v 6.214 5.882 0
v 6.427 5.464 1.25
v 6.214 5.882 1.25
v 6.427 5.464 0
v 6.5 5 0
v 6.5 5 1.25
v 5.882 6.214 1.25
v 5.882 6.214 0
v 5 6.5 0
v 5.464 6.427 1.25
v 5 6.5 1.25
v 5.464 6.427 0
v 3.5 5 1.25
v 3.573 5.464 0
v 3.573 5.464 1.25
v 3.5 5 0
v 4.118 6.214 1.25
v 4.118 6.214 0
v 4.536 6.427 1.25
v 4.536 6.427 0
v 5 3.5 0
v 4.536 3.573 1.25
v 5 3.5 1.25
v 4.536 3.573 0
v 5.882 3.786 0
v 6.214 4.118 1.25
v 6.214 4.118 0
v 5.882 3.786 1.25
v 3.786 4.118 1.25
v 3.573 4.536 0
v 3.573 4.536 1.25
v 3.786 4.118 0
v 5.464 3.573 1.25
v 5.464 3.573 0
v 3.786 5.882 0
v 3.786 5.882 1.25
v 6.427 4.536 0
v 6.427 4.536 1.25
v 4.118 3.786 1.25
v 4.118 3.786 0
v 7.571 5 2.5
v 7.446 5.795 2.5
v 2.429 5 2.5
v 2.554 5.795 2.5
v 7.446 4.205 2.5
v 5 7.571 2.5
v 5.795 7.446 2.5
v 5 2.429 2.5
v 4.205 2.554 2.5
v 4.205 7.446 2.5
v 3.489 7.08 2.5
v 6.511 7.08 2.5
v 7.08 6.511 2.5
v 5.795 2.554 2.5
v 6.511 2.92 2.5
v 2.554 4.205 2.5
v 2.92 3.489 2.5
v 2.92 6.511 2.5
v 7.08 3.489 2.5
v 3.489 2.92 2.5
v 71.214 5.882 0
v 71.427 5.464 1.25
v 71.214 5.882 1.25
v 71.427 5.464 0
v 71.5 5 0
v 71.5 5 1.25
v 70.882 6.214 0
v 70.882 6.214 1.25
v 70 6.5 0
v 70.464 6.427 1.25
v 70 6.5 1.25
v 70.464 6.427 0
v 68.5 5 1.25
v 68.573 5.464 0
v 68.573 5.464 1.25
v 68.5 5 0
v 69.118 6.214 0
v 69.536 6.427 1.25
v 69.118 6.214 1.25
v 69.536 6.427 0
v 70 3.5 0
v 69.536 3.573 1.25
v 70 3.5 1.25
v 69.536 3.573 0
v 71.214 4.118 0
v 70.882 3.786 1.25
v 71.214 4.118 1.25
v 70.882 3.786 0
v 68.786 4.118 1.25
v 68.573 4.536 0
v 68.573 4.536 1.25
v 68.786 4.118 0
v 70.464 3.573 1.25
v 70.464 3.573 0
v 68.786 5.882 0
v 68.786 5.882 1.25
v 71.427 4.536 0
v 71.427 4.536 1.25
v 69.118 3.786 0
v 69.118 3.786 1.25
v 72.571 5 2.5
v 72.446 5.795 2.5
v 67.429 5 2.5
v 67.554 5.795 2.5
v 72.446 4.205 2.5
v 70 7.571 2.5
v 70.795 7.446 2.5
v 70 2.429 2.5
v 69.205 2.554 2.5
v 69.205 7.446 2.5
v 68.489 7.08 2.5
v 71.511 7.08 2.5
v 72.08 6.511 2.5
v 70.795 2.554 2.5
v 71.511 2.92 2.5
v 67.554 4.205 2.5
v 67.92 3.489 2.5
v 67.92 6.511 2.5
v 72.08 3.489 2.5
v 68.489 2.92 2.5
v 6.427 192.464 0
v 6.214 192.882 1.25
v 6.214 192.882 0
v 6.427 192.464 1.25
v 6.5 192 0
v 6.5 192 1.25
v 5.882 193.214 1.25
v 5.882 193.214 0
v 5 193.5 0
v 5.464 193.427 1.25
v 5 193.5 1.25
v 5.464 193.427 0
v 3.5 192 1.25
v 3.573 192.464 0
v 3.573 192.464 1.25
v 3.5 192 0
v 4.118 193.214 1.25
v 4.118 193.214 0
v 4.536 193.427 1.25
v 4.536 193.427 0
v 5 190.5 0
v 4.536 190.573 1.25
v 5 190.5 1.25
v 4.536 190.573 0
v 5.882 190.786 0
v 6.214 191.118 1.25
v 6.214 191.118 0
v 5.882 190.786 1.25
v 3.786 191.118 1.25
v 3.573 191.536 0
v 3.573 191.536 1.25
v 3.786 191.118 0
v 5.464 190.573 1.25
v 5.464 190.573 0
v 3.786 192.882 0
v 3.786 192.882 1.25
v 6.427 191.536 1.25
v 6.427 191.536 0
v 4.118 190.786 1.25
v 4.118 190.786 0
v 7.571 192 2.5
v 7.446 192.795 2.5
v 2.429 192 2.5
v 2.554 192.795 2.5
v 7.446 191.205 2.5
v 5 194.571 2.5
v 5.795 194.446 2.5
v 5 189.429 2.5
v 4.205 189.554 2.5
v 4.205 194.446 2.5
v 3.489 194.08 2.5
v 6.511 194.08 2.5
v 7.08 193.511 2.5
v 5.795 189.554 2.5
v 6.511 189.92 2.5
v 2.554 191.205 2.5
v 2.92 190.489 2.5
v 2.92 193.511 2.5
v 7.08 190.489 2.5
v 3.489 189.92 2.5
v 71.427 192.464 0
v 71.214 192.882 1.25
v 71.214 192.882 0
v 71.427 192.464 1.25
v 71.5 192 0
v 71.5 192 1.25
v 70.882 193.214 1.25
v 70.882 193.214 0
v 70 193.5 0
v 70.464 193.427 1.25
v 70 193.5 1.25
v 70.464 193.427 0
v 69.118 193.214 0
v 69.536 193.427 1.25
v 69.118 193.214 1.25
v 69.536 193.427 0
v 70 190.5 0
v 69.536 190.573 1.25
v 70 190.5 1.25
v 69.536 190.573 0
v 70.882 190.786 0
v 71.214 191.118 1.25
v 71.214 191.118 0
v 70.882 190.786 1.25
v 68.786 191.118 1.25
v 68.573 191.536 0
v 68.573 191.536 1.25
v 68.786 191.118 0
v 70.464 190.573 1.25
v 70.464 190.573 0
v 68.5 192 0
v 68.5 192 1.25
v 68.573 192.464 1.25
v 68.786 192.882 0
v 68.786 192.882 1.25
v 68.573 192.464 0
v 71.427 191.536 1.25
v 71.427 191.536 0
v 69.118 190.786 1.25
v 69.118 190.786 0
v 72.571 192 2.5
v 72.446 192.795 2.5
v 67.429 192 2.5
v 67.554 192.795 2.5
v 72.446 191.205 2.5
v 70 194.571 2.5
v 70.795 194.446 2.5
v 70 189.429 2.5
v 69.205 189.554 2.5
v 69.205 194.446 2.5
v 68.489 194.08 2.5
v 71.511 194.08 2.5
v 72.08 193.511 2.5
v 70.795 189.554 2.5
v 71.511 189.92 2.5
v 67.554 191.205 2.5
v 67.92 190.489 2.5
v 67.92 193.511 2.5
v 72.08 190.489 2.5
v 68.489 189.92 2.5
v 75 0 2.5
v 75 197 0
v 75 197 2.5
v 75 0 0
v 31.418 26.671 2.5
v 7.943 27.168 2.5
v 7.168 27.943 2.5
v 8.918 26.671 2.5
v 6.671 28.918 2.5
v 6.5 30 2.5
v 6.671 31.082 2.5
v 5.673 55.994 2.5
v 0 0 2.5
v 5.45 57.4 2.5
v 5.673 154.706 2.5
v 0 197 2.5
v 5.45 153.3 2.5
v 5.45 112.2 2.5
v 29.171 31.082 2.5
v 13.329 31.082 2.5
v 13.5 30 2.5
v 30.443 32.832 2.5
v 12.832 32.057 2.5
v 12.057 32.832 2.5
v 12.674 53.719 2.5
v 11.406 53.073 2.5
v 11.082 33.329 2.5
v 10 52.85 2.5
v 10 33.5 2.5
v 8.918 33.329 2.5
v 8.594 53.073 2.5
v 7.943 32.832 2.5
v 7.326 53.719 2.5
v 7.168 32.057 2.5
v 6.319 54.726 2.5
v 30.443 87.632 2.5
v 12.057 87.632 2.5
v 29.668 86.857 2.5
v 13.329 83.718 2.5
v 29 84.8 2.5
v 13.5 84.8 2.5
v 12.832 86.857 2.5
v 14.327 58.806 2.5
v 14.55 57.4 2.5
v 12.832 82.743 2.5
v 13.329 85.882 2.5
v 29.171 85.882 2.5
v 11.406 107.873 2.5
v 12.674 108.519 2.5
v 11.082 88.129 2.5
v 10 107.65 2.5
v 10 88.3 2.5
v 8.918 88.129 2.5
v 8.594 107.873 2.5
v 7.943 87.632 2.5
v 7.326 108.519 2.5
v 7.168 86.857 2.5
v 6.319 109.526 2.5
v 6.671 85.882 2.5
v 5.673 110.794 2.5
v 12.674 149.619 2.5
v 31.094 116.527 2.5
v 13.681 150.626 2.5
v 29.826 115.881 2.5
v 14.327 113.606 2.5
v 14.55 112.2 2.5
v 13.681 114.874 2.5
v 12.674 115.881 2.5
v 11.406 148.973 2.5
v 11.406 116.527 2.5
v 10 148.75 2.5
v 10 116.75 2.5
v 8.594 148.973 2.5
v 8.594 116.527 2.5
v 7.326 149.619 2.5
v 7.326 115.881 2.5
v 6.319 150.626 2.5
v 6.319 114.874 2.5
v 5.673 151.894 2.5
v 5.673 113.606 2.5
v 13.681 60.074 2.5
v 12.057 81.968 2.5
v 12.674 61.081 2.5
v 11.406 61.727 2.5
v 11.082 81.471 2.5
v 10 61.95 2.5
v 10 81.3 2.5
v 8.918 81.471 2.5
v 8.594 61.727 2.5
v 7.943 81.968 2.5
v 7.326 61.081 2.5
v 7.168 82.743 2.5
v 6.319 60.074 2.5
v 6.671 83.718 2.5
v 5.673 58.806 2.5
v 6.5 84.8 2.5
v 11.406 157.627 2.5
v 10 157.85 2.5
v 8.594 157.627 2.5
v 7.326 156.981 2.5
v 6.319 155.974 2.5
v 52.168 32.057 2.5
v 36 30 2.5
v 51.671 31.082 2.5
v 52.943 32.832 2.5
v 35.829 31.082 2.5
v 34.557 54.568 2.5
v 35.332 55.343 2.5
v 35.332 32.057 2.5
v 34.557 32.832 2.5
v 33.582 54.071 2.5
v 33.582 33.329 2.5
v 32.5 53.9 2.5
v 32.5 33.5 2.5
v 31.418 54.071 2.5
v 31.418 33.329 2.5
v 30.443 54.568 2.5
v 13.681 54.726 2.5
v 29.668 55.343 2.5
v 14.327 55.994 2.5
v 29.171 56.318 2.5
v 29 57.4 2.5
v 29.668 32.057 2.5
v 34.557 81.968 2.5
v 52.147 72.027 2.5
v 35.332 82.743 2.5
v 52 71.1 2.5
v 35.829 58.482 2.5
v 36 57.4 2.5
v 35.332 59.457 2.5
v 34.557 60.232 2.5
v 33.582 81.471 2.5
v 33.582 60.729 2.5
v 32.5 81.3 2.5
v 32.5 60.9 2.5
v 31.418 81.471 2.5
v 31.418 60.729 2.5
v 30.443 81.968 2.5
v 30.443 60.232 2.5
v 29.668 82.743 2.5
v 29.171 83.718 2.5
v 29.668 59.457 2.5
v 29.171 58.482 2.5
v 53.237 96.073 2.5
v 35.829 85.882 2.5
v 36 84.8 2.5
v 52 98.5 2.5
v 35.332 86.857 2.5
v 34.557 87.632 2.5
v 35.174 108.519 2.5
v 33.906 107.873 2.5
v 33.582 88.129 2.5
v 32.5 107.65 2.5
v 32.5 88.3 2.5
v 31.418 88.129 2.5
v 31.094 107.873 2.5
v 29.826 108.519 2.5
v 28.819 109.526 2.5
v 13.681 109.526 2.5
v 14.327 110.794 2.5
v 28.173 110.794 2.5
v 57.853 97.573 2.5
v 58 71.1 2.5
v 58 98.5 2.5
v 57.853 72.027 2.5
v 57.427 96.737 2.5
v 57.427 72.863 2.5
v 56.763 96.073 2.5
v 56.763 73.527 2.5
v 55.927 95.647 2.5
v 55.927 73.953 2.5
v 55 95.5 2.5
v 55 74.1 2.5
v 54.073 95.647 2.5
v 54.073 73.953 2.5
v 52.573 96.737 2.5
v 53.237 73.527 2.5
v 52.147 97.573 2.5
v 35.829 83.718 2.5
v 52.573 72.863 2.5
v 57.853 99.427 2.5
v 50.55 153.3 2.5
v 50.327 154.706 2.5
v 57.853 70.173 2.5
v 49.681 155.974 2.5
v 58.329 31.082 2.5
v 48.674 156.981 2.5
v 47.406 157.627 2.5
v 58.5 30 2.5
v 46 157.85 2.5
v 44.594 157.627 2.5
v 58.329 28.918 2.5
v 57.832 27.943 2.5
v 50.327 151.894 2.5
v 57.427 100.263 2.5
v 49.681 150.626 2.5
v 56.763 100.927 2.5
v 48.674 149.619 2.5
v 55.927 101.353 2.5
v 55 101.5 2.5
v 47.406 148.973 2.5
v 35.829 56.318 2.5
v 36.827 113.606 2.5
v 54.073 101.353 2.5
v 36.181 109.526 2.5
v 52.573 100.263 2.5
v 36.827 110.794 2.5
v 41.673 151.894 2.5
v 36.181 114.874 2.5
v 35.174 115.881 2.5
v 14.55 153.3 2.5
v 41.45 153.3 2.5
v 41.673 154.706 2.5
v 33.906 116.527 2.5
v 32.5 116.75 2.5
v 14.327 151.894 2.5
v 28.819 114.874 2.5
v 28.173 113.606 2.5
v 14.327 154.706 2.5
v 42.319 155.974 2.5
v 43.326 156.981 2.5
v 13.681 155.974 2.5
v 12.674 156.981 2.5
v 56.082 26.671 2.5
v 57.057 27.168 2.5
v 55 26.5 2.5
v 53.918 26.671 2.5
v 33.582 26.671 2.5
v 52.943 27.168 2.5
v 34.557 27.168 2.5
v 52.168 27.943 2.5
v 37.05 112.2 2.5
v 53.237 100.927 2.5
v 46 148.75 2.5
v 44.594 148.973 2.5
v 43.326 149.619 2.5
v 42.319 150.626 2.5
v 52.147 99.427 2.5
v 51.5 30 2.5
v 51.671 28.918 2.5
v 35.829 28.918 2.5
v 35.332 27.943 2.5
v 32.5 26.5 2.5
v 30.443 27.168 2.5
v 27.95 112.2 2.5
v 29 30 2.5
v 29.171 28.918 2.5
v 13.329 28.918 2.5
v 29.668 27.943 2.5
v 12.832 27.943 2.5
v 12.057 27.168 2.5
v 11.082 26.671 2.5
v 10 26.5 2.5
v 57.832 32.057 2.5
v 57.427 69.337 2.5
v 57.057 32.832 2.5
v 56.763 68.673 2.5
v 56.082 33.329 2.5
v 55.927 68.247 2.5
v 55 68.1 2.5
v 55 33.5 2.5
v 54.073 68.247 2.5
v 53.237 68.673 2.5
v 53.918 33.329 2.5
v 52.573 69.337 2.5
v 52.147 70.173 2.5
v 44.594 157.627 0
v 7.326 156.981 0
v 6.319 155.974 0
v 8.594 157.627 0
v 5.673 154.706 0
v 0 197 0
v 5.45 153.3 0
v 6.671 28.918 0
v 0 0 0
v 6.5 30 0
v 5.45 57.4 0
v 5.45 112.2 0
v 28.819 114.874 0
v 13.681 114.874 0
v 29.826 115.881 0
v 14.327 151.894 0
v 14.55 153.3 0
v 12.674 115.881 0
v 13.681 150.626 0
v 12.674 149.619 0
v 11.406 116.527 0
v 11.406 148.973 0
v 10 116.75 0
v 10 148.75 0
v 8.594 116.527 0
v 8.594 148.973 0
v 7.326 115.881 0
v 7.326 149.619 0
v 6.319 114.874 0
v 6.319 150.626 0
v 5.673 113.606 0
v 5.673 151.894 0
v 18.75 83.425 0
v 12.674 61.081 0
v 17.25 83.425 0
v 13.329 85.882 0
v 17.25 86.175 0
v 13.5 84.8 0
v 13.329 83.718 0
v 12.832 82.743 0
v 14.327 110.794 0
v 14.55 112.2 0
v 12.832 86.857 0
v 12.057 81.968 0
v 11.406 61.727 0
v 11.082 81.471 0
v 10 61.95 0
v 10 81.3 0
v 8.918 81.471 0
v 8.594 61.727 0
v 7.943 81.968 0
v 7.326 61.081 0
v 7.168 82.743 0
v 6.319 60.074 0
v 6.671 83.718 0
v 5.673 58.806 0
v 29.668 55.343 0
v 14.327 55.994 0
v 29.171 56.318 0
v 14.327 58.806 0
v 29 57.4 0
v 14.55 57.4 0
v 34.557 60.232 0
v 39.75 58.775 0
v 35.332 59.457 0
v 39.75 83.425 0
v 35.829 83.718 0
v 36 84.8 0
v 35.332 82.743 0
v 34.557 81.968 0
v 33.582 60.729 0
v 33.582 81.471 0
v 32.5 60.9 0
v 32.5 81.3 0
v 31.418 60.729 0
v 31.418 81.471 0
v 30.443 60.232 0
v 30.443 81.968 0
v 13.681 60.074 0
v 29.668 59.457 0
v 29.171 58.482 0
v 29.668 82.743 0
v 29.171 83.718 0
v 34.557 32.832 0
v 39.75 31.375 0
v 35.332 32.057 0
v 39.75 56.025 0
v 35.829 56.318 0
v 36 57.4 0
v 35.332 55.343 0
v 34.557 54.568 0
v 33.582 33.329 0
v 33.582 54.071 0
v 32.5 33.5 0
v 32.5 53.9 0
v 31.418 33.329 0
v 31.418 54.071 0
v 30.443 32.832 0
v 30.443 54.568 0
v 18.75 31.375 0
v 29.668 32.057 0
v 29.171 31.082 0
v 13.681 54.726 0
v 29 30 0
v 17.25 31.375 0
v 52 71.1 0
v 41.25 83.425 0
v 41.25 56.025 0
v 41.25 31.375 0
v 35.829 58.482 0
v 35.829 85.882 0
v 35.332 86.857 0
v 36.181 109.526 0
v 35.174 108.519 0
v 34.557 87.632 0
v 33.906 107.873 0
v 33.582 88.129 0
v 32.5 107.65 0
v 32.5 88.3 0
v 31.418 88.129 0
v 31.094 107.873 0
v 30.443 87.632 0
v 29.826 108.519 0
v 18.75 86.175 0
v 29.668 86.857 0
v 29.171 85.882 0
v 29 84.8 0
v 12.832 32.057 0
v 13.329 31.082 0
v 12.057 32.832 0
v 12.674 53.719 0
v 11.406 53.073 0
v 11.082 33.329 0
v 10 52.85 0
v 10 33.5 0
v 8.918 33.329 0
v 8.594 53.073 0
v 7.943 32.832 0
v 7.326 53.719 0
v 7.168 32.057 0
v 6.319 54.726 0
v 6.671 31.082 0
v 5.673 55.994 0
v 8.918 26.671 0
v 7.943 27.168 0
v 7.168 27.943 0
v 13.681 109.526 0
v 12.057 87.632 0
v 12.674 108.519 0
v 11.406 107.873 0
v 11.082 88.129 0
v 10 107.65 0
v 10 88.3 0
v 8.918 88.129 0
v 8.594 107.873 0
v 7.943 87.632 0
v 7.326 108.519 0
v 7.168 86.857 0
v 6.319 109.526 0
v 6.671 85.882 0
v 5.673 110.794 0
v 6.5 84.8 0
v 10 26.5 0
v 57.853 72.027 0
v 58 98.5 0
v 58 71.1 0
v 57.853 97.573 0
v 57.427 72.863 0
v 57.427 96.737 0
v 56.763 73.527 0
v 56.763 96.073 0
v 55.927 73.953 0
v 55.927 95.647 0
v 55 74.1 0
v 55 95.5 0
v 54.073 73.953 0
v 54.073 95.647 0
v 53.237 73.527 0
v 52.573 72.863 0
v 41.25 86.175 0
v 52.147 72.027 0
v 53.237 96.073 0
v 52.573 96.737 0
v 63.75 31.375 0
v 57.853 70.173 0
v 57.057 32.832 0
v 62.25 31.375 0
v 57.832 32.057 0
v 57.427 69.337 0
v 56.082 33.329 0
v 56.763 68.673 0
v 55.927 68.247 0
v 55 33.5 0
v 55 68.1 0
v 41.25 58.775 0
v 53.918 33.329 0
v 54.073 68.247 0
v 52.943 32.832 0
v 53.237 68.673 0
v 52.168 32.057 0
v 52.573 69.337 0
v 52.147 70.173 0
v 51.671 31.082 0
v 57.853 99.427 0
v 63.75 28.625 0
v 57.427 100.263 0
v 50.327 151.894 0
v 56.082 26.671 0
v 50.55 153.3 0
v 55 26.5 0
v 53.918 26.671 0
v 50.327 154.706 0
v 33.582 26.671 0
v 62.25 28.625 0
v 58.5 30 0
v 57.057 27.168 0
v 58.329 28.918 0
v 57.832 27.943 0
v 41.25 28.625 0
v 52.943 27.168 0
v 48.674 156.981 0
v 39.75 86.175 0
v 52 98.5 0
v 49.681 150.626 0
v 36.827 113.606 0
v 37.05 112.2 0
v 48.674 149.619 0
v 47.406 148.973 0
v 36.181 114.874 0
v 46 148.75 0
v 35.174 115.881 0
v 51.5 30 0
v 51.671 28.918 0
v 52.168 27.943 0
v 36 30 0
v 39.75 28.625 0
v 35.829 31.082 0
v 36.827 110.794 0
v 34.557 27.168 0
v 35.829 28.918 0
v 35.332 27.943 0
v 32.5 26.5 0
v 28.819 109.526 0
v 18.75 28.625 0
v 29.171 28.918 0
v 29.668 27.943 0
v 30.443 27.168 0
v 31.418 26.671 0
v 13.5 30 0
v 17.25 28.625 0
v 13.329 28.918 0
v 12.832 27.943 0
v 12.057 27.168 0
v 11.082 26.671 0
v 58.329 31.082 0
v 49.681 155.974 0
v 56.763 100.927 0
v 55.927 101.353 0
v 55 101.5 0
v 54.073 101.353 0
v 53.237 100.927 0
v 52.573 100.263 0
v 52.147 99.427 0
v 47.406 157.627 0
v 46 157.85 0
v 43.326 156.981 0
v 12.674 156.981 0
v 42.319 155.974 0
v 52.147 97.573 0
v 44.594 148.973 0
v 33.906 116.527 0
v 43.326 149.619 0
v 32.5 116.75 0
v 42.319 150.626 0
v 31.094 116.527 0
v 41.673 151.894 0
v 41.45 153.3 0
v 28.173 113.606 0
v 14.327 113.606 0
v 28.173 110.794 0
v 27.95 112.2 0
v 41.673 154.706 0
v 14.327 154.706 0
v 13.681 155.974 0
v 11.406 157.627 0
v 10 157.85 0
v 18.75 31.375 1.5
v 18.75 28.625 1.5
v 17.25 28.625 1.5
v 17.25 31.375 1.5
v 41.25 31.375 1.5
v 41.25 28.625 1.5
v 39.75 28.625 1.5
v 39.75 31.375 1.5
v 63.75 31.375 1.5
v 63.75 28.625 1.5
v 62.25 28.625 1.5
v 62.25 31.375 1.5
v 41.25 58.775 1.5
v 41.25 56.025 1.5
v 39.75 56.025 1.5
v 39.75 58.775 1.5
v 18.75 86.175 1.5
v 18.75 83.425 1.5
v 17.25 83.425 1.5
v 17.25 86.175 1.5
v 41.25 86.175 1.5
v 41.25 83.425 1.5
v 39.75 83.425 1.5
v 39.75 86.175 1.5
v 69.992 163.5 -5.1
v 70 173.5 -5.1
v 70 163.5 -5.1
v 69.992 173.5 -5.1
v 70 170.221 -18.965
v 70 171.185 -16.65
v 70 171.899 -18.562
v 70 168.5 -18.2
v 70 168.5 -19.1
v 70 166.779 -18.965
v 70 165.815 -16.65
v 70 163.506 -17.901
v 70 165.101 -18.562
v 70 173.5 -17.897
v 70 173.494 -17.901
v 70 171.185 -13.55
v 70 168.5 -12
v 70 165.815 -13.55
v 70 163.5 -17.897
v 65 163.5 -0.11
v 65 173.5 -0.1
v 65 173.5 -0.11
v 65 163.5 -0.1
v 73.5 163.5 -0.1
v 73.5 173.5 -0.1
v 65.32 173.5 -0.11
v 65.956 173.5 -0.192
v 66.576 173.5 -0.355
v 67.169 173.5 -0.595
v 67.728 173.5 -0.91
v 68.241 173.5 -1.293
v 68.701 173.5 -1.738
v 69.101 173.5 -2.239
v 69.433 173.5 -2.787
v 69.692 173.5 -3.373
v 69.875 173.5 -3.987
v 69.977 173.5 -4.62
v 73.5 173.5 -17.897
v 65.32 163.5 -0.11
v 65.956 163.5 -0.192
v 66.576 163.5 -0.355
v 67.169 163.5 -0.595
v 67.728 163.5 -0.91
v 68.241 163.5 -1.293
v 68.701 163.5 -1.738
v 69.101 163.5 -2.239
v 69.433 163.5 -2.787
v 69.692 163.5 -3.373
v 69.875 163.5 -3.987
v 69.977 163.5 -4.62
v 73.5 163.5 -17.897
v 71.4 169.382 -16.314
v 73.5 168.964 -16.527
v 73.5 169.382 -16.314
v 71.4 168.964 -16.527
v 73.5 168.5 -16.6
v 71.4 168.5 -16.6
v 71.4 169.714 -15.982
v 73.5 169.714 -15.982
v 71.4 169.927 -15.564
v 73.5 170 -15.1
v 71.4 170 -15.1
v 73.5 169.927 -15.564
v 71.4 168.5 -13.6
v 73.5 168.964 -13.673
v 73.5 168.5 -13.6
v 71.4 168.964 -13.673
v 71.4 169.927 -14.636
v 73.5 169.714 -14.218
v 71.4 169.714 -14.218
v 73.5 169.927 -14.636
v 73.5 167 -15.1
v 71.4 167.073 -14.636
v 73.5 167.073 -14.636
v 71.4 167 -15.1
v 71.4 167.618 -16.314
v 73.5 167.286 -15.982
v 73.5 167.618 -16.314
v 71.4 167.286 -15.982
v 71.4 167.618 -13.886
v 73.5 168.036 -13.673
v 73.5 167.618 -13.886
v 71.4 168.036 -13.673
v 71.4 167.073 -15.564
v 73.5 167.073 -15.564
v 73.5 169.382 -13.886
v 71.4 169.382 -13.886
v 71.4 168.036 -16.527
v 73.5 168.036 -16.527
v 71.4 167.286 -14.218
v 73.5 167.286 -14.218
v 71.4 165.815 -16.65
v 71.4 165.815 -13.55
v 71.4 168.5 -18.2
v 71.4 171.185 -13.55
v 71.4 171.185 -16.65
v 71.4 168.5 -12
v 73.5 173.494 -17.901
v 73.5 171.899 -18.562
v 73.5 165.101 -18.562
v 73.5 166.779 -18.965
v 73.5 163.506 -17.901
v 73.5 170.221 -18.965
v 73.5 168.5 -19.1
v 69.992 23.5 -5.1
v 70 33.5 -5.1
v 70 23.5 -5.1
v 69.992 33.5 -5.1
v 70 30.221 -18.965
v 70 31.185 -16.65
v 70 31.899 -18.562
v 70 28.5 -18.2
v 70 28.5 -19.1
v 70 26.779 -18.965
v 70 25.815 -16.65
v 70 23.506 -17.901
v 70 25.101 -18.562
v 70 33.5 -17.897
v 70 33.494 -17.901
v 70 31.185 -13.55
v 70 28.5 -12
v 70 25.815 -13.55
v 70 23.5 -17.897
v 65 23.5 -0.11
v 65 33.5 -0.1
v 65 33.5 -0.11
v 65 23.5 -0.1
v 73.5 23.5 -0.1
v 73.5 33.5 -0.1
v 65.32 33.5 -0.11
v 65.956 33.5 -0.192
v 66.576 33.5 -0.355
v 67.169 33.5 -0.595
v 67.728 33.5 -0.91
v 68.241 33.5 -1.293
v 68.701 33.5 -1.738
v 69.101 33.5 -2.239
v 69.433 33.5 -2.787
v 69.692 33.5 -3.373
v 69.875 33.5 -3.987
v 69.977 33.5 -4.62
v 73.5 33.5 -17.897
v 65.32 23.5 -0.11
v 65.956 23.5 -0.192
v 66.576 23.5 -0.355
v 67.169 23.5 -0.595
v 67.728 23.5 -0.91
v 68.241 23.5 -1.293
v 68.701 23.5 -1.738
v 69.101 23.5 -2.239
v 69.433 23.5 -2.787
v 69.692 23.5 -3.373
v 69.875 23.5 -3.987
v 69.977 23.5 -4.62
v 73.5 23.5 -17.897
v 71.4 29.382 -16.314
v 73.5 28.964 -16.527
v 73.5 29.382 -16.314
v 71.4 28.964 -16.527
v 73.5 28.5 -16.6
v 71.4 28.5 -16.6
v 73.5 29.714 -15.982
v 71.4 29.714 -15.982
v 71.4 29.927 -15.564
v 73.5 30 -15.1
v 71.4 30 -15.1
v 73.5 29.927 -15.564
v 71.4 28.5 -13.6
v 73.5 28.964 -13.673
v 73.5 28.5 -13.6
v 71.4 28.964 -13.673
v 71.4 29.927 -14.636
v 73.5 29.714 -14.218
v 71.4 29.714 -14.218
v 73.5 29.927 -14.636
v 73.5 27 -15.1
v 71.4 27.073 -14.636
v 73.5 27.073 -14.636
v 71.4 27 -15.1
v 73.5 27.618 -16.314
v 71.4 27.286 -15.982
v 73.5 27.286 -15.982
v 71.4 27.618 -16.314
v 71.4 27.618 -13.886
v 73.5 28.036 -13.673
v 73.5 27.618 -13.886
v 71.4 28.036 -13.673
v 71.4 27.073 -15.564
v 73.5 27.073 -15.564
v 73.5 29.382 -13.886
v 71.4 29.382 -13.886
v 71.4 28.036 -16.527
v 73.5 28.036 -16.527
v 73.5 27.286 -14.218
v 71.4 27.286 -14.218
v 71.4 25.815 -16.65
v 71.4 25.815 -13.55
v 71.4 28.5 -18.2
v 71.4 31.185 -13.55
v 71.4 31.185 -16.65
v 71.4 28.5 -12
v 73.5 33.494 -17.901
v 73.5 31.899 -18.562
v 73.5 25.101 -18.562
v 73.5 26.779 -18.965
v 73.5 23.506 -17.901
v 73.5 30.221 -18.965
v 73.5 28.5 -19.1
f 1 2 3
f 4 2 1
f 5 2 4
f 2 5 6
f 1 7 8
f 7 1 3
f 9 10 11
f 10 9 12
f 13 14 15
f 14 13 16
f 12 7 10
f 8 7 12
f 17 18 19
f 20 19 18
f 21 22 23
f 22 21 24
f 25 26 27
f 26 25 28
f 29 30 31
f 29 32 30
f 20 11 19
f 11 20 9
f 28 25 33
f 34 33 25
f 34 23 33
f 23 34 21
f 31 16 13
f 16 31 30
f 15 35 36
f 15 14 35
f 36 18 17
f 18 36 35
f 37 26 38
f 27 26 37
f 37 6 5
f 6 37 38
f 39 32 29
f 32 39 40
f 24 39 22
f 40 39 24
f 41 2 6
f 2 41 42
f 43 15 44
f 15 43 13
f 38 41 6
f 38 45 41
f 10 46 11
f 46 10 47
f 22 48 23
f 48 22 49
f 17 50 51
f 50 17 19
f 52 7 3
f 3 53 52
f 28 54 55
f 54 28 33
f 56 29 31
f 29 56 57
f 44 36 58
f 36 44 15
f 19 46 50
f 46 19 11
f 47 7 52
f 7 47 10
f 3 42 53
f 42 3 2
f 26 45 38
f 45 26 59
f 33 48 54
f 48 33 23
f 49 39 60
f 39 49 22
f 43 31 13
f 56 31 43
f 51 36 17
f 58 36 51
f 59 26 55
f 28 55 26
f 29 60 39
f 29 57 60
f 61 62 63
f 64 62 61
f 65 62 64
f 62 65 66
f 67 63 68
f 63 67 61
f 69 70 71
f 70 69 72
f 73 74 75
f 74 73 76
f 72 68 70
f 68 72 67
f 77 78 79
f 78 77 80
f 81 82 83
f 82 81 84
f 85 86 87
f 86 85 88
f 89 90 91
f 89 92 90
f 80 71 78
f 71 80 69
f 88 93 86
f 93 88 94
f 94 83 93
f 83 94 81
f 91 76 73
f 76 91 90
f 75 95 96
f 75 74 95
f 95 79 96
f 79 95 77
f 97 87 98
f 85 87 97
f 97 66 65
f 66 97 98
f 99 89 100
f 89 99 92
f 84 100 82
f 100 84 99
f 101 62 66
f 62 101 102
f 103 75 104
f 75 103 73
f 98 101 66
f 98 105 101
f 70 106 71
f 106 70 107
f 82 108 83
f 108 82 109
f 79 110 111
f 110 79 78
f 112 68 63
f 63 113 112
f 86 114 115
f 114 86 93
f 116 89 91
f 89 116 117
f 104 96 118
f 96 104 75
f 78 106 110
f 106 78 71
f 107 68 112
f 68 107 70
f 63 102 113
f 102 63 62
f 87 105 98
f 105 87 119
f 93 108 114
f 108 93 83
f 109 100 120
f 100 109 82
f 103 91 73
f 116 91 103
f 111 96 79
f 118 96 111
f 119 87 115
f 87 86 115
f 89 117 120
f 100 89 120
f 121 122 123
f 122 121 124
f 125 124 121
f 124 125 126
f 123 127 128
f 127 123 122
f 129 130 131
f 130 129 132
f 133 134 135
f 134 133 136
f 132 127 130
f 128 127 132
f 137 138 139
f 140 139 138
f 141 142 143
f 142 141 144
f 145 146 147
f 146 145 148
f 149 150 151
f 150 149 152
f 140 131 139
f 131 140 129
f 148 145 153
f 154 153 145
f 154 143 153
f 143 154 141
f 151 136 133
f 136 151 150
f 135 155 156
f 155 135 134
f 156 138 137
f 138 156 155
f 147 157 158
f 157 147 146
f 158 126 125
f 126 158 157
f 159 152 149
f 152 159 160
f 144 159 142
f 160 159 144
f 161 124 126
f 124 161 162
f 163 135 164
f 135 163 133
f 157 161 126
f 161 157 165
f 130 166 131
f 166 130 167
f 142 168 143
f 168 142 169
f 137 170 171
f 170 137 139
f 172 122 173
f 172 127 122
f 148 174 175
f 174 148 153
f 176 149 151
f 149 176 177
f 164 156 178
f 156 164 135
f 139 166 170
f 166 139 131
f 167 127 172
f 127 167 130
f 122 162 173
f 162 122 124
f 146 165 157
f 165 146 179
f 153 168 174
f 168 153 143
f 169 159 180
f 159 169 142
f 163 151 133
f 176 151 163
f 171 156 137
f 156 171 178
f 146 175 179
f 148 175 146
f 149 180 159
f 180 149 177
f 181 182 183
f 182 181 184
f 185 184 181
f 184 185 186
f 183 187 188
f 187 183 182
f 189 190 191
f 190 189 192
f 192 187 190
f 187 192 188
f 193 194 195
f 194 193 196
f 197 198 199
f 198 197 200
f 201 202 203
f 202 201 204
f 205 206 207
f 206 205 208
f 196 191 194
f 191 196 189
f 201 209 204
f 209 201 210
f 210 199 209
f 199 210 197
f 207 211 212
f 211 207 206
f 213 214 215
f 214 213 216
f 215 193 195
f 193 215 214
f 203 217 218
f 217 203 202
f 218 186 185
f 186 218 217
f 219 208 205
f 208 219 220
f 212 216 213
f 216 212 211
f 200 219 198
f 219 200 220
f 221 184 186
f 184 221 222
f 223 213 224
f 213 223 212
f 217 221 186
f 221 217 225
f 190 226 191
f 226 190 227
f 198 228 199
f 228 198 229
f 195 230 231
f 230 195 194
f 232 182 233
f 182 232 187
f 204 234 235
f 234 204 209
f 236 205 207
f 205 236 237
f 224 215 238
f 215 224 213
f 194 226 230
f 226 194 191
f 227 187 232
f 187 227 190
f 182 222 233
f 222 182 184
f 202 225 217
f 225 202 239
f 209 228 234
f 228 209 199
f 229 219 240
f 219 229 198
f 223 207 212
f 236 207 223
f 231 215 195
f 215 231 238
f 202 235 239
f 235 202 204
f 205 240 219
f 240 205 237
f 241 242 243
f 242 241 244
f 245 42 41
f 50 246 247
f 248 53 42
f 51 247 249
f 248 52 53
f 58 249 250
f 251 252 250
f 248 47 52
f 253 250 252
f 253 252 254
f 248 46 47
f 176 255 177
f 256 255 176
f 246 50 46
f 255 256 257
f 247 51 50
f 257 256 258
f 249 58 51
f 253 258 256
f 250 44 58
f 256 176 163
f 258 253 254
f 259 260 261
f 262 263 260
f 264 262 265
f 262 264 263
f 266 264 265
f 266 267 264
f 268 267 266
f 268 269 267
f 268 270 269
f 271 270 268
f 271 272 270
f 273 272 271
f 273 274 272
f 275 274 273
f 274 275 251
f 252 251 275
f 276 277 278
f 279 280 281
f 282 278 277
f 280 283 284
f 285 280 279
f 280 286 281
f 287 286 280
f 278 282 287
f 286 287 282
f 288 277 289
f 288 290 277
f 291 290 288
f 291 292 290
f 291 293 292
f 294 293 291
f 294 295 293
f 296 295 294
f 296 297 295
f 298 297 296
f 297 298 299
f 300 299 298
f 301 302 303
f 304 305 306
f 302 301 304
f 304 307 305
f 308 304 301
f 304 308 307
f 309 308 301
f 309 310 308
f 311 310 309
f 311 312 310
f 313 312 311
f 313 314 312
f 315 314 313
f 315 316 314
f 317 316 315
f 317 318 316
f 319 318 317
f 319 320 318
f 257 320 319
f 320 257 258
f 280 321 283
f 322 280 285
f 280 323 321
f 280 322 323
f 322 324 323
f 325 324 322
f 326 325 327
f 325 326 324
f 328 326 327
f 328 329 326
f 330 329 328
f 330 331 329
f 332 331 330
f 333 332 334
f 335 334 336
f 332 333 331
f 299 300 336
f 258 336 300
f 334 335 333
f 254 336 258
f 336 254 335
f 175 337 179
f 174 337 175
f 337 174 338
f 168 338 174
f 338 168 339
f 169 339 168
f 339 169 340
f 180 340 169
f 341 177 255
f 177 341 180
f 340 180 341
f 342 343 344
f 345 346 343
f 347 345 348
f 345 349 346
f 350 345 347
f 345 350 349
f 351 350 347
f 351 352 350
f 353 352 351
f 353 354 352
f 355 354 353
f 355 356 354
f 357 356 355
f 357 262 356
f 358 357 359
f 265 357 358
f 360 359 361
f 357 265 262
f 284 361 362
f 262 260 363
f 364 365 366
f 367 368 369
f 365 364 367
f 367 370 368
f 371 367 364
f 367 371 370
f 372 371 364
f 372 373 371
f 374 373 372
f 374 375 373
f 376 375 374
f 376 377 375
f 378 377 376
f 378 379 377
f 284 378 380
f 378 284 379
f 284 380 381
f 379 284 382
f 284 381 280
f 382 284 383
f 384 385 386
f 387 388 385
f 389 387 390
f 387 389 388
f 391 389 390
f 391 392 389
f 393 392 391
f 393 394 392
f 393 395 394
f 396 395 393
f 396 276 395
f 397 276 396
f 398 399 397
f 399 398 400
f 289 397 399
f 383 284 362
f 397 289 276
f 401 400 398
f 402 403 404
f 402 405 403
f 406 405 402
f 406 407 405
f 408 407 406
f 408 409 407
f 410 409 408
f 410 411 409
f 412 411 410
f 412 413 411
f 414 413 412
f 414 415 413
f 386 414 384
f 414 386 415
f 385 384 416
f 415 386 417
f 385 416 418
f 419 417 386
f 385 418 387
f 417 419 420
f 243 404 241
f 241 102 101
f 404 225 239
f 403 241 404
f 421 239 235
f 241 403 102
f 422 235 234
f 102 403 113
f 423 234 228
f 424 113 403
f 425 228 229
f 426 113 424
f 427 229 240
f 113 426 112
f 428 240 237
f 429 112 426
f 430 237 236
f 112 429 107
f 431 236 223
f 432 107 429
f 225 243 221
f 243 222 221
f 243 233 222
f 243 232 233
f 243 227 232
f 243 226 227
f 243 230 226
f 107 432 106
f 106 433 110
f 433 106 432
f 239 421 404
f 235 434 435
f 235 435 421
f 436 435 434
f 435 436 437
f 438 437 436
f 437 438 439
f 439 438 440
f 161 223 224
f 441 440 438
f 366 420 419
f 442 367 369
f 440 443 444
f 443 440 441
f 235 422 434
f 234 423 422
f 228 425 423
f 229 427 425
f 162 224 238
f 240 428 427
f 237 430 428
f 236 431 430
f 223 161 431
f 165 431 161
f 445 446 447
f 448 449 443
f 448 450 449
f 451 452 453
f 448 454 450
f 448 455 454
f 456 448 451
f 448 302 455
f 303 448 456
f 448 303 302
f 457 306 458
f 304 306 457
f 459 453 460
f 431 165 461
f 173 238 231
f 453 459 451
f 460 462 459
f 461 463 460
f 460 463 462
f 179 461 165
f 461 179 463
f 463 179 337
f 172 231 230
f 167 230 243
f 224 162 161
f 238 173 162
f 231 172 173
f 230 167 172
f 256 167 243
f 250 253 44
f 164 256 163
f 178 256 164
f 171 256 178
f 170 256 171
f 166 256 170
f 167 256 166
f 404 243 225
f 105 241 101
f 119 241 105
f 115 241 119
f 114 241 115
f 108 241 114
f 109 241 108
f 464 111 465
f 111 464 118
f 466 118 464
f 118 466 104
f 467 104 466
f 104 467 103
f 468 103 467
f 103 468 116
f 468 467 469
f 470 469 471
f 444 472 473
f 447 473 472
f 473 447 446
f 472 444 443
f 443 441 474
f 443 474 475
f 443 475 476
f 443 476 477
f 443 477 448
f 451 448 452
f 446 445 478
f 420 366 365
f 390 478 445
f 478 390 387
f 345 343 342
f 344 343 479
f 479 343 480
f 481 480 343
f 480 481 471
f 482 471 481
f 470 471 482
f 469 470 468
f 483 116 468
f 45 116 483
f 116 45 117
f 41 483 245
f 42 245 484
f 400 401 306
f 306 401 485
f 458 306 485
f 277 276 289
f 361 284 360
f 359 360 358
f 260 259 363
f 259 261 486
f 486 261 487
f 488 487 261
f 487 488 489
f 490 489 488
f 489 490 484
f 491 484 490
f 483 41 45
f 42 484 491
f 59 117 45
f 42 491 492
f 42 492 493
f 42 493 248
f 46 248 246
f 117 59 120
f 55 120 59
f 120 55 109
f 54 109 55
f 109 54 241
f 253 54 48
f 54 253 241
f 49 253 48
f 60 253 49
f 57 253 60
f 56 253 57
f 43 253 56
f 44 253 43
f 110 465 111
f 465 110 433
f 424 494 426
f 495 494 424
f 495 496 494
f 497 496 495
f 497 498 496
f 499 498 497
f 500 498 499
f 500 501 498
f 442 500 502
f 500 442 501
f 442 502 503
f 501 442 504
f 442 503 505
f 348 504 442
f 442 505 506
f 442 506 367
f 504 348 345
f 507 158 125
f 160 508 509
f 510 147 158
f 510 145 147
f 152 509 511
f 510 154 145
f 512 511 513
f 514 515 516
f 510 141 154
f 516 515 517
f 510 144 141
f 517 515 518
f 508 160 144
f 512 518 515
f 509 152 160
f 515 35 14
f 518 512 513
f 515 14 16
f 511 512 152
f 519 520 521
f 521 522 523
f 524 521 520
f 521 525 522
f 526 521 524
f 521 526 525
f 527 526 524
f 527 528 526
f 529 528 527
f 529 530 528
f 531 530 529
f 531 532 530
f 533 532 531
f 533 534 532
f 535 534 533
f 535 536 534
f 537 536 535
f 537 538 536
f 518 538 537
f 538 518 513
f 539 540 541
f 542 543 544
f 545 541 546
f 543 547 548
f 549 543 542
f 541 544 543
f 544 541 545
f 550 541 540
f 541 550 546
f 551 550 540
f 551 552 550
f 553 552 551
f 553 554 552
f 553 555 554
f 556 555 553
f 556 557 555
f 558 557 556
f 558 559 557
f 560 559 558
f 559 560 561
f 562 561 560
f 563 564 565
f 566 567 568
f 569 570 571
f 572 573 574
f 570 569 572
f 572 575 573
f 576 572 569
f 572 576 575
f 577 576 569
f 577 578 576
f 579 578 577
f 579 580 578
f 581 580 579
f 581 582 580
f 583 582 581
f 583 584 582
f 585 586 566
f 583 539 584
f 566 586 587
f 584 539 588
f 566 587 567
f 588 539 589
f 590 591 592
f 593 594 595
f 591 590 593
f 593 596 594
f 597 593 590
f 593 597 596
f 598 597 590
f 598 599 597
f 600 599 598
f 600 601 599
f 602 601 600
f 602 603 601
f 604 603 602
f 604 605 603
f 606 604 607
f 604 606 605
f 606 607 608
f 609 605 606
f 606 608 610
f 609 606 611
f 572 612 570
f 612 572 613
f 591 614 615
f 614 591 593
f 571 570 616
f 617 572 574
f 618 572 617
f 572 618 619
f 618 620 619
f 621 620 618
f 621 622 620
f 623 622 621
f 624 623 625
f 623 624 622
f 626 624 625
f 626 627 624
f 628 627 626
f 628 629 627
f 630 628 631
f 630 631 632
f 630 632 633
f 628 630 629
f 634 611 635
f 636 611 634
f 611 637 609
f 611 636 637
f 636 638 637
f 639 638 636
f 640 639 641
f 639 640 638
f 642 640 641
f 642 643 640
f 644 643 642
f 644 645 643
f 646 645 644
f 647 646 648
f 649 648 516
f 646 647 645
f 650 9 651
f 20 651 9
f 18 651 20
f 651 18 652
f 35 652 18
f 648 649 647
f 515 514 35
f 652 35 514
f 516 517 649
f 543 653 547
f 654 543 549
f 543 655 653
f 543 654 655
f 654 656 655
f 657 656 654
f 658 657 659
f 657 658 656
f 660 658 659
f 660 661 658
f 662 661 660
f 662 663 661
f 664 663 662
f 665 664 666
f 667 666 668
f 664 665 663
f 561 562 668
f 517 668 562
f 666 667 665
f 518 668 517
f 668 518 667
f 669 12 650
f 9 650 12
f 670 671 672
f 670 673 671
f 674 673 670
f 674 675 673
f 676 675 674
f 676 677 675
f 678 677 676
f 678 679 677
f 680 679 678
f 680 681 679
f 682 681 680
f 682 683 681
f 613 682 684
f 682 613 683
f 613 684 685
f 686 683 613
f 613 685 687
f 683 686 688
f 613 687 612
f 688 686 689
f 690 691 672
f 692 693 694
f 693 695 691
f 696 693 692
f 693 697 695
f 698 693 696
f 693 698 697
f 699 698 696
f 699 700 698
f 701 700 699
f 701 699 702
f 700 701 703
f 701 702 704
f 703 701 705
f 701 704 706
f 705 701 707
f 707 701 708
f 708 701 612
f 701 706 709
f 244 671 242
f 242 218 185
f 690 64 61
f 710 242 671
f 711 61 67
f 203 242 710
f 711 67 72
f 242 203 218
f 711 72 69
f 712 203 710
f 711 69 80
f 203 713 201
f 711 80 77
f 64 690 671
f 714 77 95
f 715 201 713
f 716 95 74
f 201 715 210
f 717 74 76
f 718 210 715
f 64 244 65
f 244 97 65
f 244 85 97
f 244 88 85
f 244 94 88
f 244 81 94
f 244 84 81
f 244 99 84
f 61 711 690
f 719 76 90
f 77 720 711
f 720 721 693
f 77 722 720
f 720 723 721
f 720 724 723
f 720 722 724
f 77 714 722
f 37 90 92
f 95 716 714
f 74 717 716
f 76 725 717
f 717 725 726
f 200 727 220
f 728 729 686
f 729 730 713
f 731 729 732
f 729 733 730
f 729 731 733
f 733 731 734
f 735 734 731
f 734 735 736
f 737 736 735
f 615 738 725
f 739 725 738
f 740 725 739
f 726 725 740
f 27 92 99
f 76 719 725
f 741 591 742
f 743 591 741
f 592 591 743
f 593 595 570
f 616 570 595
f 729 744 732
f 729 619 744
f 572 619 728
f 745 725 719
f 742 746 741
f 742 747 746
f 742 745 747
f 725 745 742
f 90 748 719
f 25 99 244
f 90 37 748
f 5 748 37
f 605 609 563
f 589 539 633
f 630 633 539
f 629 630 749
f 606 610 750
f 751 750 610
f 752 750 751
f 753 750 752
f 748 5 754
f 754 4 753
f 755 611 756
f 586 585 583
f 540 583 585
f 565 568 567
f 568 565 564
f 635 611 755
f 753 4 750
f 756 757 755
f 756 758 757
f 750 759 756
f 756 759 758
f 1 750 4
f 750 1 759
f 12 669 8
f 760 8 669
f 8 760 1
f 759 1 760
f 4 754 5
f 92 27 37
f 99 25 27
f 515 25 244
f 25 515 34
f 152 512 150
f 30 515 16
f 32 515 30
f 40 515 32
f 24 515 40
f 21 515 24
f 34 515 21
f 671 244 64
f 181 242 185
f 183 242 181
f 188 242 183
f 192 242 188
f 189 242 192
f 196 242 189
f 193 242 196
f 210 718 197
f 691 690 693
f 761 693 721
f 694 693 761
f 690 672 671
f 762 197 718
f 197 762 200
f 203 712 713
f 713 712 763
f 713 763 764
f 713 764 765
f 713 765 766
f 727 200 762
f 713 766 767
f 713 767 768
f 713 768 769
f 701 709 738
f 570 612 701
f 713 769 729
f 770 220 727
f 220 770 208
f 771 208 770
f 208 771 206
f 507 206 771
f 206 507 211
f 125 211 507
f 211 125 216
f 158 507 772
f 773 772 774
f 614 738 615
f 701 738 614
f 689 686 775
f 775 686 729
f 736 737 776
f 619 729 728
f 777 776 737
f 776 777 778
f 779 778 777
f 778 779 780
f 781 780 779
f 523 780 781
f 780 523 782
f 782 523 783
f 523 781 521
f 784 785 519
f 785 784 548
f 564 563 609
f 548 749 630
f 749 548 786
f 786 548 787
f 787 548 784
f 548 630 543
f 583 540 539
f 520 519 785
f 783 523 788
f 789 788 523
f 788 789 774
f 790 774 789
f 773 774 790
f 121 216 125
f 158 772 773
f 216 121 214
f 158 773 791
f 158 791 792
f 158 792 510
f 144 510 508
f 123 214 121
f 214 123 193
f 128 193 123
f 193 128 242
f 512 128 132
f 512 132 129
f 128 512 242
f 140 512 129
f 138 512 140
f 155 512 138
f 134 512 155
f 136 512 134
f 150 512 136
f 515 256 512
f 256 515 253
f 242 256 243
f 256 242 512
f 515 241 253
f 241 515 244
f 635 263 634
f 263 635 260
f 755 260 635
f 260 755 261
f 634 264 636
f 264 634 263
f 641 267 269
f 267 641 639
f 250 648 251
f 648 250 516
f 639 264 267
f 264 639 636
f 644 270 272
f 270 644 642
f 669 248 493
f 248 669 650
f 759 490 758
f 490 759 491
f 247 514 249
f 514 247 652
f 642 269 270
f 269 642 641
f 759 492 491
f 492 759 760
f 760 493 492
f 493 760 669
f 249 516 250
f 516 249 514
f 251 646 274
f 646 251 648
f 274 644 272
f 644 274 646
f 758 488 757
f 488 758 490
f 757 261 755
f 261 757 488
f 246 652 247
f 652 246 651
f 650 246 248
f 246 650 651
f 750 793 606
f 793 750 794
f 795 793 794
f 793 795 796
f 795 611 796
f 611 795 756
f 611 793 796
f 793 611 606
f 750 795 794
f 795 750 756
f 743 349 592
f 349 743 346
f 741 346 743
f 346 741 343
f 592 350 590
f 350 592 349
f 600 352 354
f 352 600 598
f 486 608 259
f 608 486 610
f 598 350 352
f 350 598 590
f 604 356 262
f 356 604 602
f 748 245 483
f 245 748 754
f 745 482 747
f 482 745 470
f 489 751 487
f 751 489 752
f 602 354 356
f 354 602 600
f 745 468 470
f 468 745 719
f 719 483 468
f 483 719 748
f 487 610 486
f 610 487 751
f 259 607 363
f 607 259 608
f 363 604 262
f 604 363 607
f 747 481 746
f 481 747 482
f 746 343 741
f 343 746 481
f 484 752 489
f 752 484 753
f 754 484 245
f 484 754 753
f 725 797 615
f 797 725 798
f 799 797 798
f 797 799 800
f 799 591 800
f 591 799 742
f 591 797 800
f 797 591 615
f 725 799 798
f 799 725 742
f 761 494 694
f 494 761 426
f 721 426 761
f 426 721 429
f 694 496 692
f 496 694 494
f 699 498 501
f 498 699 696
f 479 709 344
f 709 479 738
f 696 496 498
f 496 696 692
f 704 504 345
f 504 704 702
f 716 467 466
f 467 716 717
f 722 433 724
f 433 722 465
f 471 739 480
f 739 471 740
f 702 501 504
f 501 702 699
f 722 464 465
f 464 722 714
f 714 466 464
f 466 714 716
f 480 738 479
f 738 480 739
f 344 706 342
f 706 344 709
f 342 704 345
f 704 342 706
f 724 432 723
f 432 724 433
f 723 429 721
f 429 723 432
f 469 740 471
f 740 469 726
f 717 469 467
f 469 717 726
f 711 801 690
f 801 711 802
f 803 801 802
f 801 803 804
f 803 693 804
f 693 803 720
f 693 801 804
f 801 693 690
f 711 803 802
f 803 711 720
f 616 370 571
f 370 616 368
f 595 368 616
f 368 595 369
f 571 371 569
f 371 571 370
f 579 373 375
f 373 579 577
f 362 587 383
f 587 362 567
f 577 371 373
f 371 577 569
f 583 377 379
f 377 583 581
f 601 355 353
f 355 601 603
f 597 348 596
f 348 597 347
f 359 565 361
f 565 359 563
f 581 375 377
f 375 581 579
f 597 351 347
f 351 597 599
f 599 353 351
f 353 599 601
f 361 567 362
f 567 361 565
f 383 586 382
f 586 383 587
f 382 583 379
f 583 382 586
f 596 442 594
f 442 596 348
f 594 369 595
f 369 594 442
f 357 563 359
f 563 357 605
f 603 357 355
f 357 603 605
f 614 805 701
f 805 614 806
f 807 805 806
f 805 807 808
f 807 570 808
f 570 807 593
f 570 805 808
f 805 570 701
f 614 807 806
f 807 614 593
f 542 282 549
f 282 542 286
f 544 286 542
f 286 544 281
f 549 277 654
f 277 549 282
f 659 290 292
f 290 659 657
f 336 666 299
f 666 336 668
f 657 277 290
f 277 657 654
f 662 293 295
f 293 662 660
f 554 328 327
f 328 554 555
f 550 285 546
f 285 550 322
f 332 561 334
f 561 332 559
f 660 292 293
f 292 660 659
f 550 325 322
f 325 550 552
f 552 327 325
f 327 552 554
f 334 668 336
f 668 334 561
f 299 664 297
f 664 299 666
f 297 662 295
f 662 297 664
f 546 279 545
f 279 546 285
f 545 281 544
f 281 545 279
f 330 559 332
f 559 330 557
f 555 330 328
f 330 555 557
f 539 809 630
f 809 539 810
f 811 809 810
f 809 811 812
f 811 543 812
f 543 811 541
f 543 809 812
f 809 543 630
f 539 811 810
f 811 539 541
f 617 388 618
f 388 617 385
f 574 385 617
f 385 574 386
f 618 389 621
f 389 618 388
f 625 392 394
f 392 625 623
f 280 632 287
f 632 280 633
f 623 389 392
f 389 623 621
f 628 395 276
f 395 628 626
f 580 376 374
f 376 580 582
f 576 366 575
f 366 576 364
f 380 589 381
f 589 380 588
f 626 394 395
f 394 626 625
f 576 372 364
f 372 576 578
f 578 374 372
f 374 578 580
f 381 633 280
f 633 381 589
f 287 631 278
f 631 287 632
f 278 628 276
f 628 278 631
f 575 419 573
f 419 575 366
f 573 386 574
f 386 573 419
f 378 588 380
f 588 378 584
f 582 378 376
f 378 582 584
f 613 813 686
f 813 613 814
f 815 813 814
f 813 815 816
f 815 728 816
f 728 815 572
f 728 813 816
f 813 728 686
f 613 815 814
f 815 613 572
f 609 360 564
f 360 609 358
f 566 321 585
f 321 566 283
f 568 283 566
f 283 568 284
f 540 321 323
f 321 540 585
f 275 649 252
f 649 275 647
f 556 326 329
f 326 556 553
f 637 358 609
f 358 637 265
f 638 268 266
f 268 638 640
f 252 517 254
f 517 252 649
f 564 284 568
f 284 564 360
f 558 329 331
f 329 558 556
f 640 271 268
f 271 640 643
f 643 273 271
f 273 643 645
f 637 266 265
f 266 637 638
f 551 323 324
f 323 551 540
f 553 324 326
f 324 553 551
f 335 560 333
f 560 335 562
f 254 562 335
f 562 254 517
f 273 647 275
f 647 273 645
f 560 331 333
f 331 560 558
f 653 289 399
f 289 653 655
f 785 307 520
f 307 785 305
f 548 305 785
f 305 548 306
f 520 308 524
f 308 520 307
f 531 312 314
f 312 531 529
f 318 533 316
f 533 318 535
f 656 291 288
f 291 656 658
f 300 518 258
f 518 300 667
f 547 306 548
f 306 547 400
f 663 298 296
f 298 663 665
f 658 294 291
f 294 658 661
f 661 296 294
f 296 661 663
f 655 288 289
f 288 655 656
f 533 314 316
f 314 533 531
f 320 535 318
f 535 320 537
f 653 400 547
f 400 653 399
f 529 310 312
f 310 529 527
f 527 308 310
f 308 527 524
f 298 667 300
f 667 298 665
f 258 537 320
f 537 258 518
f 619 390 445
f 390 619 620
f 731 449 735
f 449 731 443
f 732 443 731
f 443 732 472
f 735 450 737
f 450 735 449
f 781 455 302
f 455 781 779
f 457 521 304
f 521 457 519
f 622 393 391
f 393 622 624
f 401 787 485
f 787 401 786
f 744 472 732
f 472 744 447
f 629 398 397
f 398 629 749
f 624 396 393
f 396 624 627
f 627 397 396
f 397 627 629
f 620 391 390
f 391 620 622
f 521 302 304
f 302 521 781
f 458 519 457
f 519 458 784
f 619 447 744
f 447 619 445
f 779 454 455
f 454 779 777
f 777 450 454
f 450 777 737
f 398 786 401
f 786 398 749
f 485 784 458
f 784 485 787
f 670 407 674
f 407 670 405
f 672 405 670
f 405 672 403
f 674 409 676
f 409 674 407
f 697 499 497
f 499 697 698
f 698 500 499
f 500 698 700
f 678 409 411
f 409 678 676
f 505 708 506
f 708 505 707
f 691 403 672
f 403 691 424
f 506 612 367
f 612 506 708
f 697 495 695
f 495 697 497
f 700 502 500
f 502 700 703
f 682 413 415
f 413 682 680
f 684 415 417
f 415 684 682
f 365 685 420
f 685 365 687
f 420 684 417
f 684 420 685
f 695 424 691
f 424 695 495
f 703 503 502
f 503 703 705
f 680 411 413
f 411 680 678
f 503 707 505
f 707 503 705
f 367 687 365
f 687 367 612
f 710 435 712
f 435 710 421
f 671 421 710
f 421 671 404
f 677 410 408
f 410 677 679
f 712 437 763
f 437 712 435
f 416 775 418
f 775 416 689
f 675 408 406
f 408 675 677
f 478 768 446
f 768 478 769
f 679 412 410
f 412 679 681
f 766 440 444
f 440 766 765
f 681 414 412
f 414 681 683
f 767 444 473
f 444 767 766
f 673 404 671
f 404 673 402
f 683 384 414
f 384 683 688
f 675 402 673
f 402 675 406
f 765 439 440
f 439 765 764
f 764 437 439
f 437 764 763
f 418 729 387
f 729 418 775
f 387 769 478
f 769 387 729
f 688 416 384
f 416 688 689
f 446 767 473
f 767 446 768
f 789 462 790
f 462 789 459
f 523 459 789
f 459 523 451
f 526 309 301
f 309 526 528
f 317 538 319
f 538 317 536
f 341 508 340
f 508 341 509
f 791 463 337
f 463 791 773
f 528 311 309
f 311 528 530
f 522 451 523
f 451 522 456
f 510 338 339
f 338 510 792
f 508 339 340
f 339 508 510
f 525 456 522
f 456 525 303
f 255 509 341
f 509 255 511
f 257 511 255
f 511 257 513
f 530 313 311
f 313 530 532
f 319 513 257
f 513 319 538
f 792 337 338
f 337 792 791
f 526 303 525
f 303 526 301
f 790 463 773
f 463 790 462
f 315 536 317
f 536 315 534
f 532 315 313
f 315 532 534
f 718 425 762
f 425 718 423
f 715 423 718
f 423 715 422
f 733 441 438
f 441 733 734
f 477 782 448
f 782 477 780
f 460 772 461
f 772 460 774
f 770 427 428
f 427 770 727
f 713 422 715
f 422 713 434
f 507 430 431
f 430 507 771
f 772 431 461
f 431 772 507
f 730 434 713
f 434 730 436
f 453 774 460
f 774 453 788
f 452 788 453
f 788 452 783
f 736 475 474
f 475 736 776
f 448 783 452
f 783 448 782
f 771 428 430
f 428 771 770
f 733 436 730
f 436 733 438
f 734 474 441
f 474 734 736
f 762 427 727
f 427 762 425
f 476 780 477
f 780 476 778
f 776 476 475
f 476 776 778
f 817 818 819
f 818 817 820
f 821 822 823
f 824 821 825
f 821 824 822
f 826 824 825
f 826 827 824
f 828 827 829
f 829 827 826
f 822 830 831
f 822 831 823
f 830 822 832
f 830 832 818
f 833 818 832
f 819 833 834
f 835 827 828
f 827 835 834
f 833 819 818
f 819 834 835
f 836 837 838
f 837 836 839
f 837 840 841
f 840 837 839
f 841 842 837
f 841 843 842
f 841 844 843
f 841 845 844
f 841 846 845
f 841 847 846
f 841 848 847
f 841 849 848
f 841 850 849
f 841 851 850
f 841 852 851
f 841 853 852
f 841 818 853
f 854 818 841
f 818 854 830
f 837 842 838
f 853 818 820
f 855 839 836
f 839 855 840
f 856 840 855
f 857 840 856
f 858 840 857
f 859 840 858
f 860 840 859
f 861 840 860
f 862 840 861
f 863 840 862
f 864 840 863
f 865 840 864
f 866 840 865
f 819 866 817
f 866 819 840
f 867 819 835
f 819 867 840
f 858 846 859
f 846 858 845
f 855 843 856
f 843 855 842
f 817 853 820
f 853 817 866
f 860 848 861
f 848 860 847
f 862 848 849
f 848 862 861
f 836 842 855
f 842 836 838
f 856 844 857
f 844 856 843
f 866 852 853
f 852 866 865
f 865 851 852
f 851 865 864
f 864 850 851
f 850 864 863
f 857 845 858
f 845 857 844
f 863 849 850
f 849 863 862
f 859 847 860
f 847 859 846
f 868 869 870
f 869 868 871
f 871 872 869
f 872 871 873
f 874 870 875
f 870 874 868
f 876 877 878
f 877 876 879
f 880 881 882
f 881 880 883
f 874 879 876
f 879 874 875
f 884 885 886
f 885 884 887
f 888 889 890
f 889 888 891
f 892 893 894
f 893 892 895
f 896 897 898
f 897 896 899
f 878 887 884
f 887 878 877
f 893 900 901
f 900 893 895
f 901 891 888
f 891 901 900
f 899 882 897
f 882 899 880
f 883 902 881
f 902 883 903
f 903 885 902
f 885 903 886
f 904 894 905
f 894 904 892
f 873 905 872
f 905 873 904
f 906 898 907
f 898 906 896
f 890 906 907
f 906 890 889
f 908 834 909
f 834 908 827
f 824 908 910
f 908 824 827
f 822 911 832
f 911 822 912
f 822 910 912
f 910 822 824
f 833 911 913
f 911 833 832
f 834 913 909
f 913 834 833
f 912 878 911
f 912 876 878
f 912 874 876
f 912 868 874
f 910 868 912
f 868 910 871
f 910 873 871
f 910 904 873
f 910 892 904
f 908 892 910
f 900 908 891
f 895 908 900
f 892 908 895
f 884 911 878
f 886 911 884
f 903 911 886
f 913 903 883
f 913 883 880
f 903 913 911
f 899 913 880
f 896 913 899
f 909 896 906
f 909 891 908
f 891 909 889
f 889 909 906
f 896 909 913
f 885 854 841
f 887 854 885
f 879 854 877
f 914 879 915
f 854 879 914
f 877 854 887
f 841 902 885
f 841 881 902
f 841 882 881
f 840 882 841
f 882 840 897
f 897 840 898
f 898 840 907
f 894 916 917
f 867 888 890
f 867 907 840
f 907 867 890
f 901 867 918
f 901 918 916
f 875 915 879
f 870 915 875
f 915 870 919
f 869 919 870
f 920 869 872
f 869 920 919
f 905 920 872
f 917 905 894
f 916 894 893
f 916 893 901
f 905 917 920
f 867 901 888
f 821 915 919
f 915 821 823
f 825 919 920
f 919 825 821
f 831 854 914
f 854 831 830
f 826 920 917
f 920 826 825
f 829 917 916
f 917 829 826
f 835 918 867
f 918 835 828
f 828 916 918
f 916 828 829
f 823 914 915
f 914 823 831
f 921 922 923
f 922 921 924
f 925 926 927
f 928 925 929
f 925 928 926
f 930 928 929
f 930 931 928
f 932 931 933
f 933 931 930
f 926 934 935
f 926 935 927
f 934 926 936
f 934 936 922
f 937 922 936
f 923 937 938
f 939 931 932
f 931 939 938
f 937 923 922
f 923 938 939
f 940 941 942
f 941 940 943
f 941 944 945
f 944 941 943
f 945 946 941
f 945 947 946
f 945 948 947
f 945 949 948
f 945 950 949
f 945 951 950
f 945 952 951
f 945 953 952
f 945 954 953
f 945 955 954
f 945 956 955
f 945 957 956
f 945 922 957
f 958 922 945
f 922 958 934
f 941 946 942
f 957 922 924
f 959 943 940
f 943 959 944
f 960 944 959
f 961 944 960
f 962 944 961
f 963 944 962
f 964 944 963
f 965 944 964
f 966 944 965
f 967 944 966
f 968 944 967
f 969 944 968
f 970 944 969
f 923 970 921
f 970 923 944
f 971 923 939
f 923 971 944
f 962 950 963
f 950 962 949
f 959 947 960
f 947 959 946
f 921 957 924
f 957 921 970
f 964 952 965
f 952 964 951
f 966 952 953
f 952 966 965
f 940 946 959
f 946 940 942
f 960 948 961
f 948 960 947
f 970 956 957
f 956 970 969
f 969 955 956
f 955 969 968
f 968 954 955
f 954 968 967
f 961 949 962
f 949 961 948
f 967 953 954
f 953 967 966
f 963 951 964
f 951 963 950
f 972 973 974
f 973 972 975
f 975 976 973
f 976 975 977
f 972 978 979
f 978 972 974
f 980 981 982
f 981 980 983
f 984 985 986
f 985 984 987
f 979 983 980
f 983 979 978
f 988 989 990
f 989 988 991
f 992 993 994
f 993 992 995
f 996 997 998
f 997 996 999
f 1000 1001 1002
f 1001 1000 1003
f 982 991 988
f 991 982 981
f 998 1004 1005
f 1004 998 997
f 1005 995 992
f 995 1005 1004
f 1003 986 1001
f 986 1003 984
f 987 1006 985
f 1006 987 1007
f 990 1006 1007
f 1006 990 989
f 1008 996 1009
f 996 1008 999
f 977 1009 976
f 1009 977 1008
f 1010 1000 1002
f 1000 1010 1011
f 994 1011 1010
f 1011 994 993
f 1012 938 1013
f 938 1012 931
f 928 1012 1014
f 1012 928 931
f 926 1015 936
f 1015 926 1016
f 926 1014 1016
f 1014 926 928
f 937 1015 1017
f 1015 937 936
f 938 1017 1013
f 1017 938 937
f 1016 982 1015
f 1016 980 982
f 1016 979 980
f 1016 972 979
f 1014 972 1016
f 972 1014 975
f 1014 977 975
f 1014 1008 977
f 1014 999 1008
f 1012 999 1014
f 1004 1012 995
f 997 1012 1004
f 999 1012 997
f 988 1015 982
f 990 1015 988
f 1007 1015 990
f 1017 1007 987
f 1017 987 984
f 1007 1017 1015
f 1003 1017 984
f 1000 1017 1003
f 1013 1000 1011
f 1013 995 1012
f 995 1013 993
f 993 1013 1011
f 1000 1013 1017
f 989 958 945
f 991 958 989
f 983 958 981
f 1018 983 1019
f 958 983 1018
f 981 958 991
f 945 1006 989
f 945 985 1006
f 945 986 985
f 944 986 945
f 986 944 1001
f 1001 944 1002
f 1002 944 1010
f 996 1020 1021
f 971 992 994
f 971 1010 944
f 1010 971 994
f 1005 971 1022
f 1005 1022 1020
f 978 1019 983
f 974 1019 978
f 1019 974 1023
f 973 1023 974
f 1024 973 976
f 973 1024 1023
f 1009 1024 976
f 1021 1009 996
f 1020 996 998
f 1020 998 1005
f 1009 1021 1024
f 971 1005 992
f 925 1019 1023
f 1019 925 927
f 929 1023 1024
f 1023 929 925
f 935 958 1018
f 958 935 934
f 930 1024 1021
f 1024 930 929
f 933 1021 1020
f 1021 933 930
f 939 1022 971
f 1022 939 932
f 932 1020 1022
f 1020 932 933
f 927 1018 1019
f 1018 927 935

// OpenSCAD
// file: kosmo.scad
panelHeight = 197;
thickness = 2.5;
mountHoleDiameter = 3.0;
jackHoleDiameter = 9.1;
ledHoleDiameter = 5;
pushButtonHoleDiameter = 7;
potHoleDiameter = 7;
switchHoleDiameter = 6;
rotarySwitchHoleDiameter = 9.1;
midiSocketHoleDiameter = 15;
colPaddingLeft = 20;
colPaddingRight = 10;
rowPadding = 30;

offsetTopBottom = 20; // Mounting area

n_rows = 6;
n_cols = width / 25;

rowsStart = rowPadding;
rowsEnd = panelHeight - rowPadding;

colsStart = colPaddingRight;
colsEnd = width - colPaddingLeft;


function row (i) = rowsStart + i * (rowsEnd - rowsStart) / (n_rows - 1);
function col (i) = colsStart + i * (colsEnd - colsStart) / (n_cols - 1);

module pcbHolders(){
  pcbHolder(width-5, panelHeight/2 + 140/2 - 5);
  pcbHolder(width-5, panelHeight/2 - 140/2 - 5);
}


module pcbHolder(x, y){
  pcbHole = 3;
  w = 10;
  h = 20;
  clearance = 15; // distance between panel and PCB hole
    
  translate([x, y, -0.1]) { // prevent gap
    rotate([0, 90, 0]) {
      union() {
        difference() {
          translate([0, 0, -5]) {               
            cube([5,w,5]);
          }
          translate([5, w+1, -5]) {
            rotate([90, 0, 0]) {
              cylinder(r=5, h=w+2,$fn=49);
            }
          }
        }
        /**/
        intersection() {
          difference() {
            cube([h, w, thickness+1]);
            translate([clearance, w/2, -0.9]){
              cylinder(r=pcbHole/2,  h=thickness+2, $fn=20);
              cylinder(r=3.1, h=2.3, $fn=6);
            }
          }
          translate([h/2-2, w/2, -1]) {
            cylinder(r=w+1, h=thickness+2, $fn=40);
          }
        }
        /**/
      }
    }
  }
}



module kosmoMountHoles(width, height) {
  punchHole(5, 5, mountHoleDiameter,true);
  punchHole((width-5), 5, mountHoleDiameter,true);
  punchHole(5, (height-5), mountHoleDiameter,true);
  punchHole((width-5), (height-5), mountHoleDiameter,true);
}


module punchHole(x, y, holeSize,chamfer=false){
  translate([x, y, -1]){
    cylinder(r=holeSize/2, h=thickness+2, $fn=20);
    if(chamfer) {
      translate([0, 0, 0.5]){
        cylinder(r2=holeSize, r1=0, h=holeSize+0.5, $fn=20);
      }
    }
  }
}

module midiSocket(x, y) {
    punchHole(x, y, midiSocketHoleDiameter);
}
module led(x, y) {
    punchHole(x, y, ledHoleDiameter);
}
module switch(x, y) { 
    punchHole(x, y, switchHoleDiameter);
}
module pushButton(x, y) { 
    punchHole(x, y, pushButtonHoleDiameter);
}
module rotarySwitch(x, y) { 
    punchHole(x, y, rotarySwitchHoleDiameter);
}
module sevenSegmentDisplay(x, y) {
    translate([x-6.5, y-9.6, -1]){
        cube([13, 19.2, thickness+2]);
    }
}

module pot(x, y) {
  translate([x, y , 0]) {
    union() {
      punchHole(0, 0, potHoleDiameter);
      translate([7.25, -2.75/2, -0.1]) {
        cube([1.5, 2.75, 1.6]);
      }
    }
  }
  echo(concat("pot at ", x, y));
}

module jack(x, y){
  punchHole(x, y, jackHoleDiameter);
    echo(concat("Jack at", x, y));
}

module panel(width) {
  difference() {
    cube([width, panelHeight, thickness]);
    kosmoMountHoles(width, panelHeight);
  }
}
// main file
width = 75;
include <kosmo.scad>


// function col(n) = 18 + n*27.5;

 difference() {
     panel(width);
     
     
     pot(col(0), row(0)); // TUNE OFFSET 1
     pot(col(1), row(0)); // TUNE OFFSET 2
     pot(col(2), row(0)); // DECAY OFFSET
     
     jack(col(0), row(1)); // TUNE CV
     pot(col(1), row(1)); // TUNE CV LVL
   
     pot(col(0), row(2)); // TUNE DEPTH
     pot(col(1), row(2)); // TUNE DECAY    
     
   
     
     jack(col(0), row(3)); // ACCENT CV
     jack(col(1), row(3)); // DECAY CV
     

     switch(col(2), row(1.5)); // FM ON/OFF
     switch(col(2), row(2.5)); // SINE/PULSE

     jack(col(0), row(4.5)); // GATE in
     jack(col(1.6), row(4.5)); // AUDIO out
     
     
     
 }
pcbHolders(90);
